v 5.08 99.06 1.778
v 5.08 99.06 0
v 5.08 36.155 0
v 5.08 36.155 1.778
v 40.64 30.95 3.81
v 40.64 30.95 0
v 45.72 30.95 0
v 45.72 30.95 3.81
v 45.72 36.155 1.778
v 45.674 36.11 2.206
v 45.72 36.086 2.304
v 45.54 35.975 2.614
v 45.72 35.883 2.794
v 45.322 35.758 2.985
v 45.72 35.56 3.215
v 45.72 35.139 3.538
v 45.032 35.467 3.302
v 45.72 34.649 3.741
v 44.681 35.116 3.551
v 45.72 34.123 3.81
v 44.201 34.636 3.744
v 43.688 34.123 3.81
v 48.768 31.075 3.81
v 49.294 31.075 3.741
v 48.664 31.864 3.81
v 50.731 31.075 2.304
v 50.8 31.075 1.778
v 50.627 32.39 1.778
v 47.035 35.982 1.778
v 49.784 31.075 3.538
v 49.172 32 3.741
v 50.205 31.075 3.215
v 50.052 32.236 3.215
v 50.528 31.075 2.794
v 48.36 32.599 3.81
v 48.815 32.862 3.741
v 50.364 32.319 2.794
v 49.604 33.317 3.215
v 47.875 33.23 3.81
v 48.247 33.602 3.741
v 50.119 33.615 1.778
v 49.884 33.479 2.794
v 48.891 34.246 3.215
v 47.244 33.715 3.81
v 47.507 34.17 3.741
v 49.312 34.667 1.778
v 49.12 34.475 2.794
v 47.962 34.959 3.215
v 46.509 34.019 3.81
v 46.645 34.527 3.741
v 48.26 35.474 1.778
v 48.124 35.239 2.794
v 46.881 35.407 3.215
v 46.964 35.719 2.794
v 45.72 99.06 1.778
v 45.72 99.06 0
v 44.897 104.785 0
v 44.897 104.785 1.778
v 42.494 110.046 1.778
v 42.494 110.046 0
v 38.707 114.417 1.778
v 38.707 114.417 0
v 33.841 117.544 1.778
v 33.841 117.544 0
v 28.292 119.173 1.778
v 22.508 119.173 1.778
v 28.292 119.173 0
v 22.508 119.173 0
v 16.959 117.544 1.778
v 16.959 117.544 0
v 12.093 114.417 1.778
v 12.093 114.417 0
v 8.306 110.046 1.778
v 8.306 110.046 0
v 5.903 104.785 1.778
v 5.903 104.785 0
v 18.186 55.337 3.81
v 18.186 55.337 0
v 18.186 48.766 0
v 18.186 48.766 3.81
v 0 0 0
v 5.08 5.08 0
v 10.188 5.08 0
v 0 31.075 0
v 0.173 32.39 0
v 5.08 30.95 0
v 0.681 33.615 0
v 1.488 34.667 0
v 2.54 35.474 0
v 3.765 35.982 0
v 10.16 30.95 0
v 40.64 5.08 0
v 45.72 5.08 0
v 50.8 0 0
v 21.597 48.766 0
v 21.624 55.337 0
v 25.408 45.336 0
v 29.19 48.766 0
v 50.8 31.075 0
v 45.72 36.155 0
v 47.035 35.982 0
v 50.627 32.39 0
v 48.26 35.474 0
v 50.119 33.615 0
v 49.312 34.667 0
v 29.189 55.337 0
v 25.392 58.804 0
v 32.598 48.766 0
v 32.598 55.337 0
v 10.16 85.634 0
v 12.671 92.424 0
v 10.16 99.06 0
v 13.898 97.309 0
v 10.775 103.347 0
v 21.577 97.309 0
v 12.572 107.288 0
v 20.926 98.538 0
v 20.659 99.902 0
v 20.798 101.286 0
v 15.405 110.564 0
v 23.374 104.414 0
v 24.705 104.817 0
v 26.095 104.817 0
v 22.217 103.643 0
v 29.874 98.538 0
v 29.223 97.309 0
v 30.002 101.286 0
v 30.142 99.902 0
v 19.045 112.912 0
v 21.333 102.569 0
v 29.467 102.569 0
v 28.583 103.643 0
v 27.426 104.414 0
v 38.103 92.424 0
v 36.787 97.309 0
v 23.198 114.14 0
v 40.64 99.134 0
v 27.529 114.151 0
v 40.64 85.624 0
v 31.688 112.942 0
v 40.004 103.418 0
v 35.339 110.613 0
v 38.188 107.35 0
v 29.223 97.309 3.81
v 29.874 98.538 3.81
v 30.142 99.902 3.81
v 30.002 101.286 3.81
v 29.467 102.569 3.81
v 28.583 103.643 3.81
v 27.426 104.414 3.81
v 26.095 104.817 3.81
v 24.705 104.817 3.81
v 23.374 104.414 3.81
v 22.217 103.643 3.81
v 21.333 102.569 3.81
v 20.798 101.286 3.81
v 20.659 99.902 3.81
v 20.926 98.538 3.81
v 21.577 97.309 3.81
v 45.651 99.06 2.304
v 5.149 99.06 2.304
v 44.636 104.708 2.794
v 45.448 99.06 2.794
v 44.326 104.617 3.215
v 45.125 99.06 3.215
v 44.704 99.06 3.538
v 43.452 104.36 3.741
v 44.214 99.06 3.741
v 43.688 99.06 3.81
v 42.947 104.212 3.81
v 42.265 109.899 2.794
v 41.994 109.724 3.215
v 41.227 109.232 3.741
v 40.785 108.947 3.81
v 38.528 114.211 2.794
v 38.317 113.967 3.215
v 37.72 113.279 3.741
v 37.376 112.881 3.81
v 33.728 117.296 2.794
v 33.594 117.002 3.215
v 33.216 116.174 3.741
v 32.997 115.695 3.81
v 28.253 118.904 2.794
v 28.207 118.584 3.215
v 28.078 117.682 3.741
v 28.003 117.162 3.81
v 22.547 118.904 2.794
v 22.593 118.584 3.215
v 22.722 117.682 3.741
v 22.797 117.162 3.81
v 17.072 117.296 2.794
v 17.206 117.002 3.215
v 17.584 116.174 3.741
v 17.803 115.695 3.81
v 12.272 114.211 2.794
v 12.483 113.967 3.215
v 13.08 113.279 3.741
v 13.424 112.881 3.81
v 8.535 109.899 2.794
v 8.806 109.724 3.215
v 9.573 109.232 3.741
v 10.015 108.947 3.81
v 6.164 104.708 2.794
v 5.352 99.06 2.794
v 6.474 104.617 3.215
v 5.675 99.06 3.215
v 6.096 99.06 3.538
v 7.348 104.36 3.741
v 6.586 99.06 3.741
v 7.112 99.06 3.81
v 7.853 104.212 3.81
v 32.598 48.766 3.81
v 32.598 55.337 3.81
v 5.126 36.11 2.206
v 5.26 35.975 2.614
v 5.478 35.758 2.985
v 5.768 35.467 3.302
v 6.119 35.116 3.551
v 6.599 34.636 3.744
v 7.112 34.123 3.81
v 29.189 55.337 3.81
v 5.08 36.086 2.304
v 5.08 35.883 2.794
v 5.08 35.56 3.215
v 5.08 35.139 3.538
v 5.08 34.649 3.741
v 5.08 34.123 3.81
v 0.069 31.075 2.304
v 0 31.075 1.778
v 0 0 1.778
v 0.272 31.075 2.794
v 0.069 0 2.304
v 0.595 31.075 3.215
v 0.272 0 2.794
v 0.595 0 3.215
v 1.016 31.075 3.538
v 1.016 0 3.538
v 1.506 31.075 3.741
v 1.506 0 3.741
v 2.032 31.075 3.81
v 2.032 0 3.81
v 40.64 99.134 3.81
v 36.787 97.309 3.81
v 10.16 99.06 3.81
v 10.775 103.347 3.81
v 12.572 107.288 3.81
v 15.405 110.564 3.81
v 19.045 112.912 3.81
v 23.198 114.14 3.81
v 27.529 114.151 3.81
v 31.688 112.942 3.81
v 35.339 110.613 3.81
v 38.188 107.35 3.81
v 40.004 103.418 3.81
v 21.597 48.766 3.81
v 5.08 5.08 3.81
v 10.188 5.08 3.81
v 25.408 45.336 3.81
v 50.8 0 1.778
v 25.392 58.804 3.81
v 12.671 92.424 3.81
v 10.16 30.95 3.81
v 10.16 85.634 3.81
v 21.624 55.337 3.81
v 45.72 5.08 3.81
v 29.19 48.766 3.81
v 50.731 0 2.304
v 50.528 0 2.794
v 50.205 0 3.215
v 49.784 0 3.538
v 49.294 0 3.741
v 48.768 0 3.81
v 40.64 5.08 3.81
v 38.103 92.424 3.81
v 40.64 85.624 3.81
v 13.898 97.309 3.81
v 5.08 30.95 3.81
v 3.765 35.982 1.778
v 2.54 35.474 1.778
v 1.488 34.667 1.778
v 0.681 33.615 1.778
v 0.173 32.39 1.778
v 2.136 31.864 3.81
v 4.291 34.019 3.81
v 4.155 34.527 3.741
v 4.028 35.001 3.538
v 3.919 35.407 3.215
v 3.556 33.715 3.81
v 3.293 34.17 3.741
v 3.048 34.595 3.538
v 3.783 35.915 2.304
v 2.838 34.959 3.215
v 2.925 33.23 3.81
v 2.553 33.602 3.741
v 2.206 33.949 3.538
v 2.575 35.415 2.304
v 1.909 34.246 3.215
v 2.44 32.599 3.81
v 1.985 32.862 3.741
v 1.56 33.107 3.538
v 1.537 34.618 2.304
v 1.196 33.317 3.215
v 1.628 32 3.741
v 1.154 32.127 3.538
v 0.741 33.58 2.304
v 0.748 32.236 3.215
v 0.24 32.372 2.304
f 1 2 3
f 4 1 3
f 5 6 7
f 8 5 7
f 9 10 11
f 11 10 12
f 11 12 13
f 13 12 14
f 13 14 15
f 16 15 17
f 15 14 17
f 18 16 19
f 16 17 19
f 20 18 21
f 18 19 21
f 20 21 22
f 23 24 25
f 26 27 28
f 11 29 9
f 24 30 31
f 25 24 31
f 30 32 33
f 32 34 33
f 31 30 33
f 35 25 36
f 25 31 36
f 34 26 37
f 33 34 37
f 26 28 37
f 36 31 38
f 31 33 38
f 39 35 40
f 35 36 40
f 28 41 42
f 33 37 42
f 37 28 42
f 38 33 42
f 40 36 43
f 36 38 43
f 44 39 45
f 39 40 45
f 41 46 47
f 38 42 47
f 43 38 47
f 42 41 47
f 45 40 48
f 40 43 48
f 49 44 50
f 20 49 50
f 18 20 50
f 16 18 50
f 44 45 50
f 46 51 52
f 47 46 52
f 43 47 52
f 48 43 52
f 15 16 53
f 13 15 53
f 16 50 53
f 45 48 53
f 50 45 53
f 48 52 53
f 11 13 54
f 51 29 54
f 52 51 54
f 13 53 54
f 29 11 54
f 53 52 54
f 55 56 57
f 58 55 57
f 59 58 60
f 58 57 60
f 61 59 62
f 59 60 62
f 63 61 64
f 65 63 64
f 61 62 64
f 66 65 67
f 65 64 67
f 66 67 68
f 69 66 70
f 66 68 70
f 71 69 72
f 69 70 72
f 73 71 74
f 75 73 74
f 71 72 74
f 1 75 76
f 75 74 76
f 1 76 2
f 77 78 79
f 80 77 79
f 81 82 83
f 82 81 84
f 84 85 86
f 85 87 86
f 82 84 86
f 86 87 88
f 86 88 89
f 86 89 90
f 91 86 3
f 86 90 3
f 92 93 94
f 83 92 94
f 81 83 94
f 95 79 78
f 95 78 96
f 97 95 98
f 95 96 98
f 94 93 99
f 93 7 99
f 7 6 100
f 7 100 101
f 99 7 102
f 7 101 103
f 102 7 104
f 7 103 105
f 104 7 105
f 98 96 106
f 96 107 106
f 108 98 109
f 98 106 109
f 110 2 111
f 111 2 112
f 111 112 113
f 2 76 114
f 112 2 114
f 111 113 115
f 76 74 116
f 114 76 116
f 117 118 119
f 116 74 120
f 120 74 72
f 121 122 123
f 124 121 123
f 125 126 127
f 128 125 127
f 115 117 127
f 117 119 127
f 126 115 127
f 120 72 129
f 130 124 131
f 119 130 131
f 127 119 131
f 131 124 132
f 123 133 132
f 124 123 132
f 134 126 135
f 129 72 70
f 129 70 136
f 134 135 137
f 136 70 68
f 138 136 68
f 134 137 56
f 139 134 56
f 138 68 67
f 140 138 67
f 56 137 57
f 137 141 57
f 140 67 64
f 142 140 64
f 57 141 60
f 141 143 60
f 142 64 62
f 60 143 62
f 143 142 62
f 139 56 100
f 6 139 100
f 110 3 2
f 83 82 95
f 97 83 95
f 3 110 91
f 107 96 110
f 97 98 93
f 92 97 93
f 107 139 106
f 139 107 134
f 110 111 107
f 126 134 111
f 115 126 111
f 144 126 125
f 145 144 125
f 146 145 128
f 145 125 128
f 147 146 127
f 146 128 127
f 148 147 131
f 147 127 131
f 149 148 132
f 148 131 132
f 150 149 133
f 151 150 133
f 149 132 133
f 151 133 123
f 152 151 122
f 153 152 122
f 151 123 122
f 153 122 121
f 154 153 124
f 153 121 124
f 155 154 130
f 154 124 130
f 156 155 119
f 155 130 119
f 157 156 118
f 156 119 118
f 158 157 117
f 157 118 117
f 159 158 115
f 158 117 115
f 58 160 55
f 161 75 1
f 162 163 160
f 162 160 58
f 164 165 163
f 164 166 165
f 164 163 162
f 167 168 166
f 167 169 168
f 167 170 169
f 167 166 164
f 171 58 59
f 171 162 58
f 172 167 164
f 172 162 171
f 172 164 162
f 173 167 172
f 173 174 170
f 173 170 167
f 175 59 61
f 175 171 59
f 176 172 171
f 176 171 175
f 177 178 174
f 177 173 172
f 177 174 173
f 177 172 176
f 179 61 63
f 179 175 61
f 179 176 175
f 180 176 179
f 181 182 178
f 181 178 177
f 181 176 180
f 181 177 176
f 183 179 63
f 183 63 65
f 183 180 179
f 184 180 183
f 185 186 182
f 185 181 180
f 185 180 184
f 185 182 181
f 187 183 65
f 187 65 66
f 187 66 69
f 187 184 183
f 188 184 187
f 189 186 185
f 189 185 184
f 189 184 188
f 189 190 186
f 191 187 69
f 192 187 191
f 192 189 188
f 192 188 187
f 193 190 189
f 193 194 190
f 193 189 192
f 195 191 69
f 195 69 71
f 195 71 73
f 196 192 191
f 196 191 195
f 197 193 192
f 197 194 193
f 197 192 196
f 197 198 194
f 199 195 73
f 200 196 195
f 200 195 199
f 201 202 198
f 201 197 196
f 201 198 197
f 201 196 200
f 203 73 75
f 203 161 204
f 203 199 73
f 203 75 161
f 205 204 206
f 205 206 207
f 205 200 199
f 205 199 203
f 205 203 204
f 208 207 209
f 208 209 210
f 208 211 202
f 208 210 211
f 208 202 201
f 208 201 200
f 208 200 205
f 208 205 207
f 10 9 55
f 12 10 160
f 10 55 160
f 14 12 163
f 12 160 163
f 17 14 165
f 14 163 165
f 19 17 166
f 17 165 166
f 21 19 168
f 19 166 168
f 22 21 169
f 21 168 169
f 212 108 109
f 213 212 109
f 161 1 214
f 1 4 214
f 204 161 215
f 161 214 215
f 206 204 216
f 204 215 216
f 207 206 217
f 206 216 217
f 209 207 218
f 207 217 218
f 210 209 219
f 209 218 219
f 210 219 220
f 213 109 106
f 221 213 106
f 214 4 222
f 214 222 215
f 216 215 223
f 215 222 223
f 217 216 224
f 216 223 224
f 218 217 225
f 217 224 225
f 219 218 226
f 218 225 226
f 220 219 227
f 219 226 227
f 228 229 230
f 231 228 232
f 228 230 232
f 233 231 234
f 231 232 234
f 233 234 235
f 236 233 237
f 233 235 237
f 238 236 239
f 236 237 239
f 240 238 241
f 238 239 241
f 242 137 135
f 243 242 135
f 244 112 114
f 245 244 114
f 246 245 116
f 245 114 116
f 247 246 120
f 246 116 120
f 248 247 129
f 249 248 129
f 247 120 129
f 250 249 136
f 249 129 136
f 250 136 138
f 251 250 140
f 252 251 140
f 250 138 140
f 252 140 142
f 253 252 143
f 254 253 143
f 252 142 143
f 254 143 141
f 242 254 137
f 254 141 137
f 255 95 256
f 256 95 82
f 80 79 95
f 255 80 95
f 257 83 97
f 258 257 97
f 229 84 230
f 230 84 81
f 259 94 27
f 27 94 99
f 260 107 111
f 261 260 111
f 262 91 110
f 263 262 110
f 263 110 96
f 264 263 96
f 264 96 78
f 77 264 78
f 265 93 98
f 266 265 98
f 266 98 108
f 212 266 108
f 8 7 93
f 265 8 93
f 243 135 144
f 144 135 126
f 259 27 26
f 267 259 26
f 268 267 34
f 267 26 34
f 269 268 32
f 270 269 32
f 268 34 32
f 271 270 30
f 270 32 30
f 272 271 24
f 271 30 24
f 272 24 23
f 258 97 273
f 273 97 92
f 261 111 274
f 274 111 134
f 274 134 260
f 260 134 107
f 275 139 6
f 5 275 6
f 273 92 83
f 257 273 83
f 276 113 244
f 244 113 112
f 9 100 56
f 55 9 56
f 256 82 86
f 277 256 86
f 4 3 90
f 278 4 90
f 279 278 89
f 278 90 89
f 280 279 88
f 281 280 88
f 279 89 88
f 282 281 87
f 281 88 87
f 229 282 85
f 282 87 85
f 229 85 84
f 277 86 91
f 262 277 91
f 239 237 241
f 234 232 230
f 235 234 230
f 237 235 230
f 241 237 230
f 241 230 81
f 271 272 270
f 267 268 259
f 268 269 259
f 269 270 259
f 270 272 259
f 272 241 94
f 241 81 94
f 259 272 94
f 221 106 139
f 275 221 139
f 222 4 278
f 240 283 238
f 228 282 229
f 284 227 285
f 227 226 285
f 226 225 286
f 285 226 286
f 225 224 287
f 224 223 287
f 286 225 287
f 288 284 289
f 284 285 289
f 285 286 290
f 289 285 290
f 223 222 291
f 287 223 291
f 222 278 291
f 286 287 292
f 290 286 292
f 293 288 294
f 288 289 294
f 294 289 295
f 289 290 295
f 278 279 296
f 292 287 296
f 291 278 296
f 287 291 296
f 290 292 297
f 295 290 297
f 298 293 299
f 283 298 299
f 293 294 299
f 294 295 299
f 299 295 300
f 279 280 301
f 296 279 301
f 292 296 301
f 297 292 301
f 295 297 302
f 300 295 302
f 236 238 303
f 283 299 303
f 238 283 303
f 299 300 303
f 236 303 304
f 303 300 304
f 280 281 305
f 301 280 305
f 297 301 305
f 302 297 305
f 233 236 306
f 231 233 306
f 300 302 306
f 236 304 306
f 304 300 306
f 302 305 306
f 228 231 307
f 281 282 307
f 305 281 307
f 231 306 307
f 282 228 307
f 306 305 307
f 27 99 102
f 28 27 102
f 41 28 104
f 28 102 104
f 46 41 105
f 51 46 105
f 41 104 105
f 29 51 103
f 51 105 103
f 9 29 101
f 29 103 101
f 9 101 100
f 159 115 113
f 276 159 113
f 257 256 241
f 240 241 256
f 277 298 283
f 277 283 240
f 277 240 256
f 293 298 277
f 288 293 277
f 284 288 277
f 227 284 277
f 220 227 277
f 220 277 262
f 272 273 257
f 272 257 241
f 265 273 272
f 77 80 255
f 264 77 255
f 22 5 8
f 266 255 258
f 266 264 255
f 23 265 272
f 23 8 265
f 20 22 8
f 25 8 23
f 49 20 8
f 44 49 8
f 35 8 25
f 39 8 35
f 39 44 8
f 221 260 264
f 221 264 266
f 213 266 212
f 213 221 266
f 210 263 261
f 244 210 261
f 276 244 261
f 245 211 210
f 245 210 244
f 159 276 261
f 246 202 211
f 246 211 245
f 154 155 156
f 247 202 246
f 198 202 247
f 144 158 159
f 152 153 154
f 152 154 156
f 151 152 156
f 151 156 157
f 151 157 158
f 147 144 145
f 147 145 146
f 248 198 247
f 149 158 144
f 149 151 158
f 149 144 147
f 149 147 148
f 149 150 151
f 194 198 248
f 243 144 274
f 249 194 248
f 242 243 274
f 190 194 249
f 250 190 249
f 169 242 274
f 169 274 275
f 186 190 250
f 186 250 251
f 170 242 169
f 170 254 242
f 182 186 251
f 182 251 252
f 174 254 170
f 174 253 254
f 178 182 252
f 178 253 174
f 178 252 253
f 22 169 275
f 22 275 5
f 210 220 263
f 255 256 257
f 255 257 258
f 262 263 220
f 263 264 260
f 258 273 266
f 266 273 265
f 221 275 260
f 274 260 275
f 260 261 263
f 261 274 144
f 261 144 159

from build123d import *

# Parameters (mm, degrees)
F1_DEPTH     = 3.81
F2_R         = 2.032
F3_T3_ANGLE  = 90
F3_T6_ANGLE  = 90
F3_T9_DEPTH  = 16.51
F3_T12_DEPTH = 16.51


# Not quite as in the source:
# - a fillet or chamfer that OpenCascade refuses, or shapes differently, is made with other operations: its cross-section is extruded or revolved along the edge and cut away or added


with BuildPart() as f1:
    # F0 (on Top) → F1 (new body)
    with BuildSketch(Plane.XY):
        with BuildLine():
            Line((0, 36.1550717625), (0, 0))
            Line((0, 0), (50.8, 0))
            Line((50.8, 0), (50.8, 36.1550717625))
            Line((50.8, 36.1550717625), (45.72, 36.1550717625))
            Line((45.72, 36.1550717625), (45.72, 99.06))
            ThreePointArc((45.72, 99.06), (25.4, 119.38), (5.08, 99.06))
            Line((5.08, 99.06), (5.08, 36.1550717625))
            Line((5.08, 36.1550717625), (0, 36.1550717625))
        make_face()
        Polygon((21.5968196758, 48.7659722567), (5.08, 5.08), (5.08, 30.9497844428), (10.16, 30.9497844428), (10.16, 85.6342857143), (21.623824299, 55.3370357813), (18.1859140491, 55.3370357813), (18.1859140491, 48.7659722567), align=None, mode=Mode.SUBTRACT)
        Polygon((40.64, 5.08), (10.1879829027, 5.08), (25.4079982621, 45.3360045931), align=None, mode=Mode.SUBTRACT)
        Polygon((45.72, 30.9497844428), (45.72, 5.08), (29.1901726596, 48.7659722567), (32.5980894268, 48.7659722567), (32.5980894268, 55.3370357813), (29.1891943801, 55.3370357813), (40.64, 85.6237124205), (40.64, 30.9497844428), align=None, mode=Mode.SUBTRACT)
        Polygon((25.3920017379, 58.8039954069), (12.6709696314, 92.4238659741), (24.3276693245, 92.4238659741), (26.4725103977, 92.4238659741), (38.1030234, 92.4238659741), align=None, mode=Mode.SUBTRACT)
        with BuildLine():
            ThreePointArc((10.16, 99.06), (25.3630832236, 114.3000449305), (40.64, 99.1340130568))
            Line((40.64, 99.1340130568), (36.7868717318, 97.3090561919))
            Line((36.7868717318, 97.3090561919), (29.223334248, 97.3090561919))
            ThreePointArc((29.223334248, 97.3090561919), (25.4000898611, 104.8685646157), (21.5768454742, 97.3090561919))
            Line((21.5768454742, 97.3090561919), (13.8981392212, 97.3090561919))
            Line((13.8981392212, 97.3090561919), (10.16, 99.06))
        make_face(mode=Mode.SUBTRACT)
    extrude(amount=F1_DEPTH)

    # F2
    f2_edges = [f1.edges().sort_by_distance(p)[0] for p in [
        (45.72, 67.607536, 3.81),
        (50.8, 18.077536, 3.81),
        (48.26, 36.155072, 3.81),
        (2.54, 36.155072, 3.81),
        (0, 18.077536, 3.81),
    ]]
    fillet(f2_edges, radius=F2_R)

    # F3: fillet of radius 5.08 on 2 edges, made by hand


with BuildPart() as f3_tool1:
    # F3_s2 → F3_t3 (revolve)
    with BuildSketch(Plane.YZ.offset(5.08)):
        with BuildLine():
            ThreePointArc((34.1230717625, 3.81), (35.5599127419, 3.2148409794), (36.1550717625, 1.778))
            Line((36.1550717625, 1.778), (36.1550717625, 3.81))
            Line((36.1550717625, 3.81), (34.1230717625, 3.81))
        make_face()
    revolve(axis=Axis((5.08, 31.0750717625, 3.81), (0, 0, 1)), revolution_arc=F3_T3_ANGLE)


with BuildPart() as f3_tool4:
    # F3_s5 → F3_t6 (revolve)
    with BuildSketch(Plane.XZ.offset(-31.0750717625)):
        with BuildLine():
            ThreePointArc((48.768, 3.81), (50.2048409794, 3.2148409794), (50.8, 1.778))
            Line((50.8, 1.778), (50.8, 3.81))
            Line((50.8, 3.81), (48.768, 3.81))
        make_face()
    revolve(axis=Axis((45.72, 31.0750717625, 3.81), (0, 0, 1)), revolution_arc=F3_T6_ANGLE)


with BuildPart() as f3_tool7:
    # F3_s8 → F3_t9 (new body)
    with BuildSketch(Plane.XY.offset(-12.7)):
        with BuildLine():
            ThreePointArc((50.8, 31.0750717625), (49.3121024484, 34.667174211), (45.72, 36.1550717625))
            Line((45.72, 36.1550717625), (50.8, 36.1550717625))
            Line((50.8, 36.1550717625), (50.8, 31.0750717625))
        make_face()
    extrude(amount=F3_T9_DEPTH)


with BuildPart() as f3_tool10:
    # F3_s11 → F3_t12 (new body)
    with BuildSketch(Plane.XY.offset(-12.7)):
        with BuildLine():
            ThreePointArc((5.08, 36.1550717625), (1.4878975516, 34.667174211), (0, 31.0750717625))
            Line((0, 31.0750717625), (0, 36.1550717625))
            Line((0, 36.1550717625), (5.08, 36.1550717625))
        make_face()
    extrude(amount=F3_T12_DEPTH)


with BuildPart() as f1_1:
    add(f1.part)

    # F3_t13: cut F3_tool1, F3_tool4, F3_tool7, F3_tool10
    add([f3_tool1.part, f3_tool4.part, f3_tool7.part, f3_tool10.part], mode=Mode.SUBTRACT)


solid = f1_1.part
